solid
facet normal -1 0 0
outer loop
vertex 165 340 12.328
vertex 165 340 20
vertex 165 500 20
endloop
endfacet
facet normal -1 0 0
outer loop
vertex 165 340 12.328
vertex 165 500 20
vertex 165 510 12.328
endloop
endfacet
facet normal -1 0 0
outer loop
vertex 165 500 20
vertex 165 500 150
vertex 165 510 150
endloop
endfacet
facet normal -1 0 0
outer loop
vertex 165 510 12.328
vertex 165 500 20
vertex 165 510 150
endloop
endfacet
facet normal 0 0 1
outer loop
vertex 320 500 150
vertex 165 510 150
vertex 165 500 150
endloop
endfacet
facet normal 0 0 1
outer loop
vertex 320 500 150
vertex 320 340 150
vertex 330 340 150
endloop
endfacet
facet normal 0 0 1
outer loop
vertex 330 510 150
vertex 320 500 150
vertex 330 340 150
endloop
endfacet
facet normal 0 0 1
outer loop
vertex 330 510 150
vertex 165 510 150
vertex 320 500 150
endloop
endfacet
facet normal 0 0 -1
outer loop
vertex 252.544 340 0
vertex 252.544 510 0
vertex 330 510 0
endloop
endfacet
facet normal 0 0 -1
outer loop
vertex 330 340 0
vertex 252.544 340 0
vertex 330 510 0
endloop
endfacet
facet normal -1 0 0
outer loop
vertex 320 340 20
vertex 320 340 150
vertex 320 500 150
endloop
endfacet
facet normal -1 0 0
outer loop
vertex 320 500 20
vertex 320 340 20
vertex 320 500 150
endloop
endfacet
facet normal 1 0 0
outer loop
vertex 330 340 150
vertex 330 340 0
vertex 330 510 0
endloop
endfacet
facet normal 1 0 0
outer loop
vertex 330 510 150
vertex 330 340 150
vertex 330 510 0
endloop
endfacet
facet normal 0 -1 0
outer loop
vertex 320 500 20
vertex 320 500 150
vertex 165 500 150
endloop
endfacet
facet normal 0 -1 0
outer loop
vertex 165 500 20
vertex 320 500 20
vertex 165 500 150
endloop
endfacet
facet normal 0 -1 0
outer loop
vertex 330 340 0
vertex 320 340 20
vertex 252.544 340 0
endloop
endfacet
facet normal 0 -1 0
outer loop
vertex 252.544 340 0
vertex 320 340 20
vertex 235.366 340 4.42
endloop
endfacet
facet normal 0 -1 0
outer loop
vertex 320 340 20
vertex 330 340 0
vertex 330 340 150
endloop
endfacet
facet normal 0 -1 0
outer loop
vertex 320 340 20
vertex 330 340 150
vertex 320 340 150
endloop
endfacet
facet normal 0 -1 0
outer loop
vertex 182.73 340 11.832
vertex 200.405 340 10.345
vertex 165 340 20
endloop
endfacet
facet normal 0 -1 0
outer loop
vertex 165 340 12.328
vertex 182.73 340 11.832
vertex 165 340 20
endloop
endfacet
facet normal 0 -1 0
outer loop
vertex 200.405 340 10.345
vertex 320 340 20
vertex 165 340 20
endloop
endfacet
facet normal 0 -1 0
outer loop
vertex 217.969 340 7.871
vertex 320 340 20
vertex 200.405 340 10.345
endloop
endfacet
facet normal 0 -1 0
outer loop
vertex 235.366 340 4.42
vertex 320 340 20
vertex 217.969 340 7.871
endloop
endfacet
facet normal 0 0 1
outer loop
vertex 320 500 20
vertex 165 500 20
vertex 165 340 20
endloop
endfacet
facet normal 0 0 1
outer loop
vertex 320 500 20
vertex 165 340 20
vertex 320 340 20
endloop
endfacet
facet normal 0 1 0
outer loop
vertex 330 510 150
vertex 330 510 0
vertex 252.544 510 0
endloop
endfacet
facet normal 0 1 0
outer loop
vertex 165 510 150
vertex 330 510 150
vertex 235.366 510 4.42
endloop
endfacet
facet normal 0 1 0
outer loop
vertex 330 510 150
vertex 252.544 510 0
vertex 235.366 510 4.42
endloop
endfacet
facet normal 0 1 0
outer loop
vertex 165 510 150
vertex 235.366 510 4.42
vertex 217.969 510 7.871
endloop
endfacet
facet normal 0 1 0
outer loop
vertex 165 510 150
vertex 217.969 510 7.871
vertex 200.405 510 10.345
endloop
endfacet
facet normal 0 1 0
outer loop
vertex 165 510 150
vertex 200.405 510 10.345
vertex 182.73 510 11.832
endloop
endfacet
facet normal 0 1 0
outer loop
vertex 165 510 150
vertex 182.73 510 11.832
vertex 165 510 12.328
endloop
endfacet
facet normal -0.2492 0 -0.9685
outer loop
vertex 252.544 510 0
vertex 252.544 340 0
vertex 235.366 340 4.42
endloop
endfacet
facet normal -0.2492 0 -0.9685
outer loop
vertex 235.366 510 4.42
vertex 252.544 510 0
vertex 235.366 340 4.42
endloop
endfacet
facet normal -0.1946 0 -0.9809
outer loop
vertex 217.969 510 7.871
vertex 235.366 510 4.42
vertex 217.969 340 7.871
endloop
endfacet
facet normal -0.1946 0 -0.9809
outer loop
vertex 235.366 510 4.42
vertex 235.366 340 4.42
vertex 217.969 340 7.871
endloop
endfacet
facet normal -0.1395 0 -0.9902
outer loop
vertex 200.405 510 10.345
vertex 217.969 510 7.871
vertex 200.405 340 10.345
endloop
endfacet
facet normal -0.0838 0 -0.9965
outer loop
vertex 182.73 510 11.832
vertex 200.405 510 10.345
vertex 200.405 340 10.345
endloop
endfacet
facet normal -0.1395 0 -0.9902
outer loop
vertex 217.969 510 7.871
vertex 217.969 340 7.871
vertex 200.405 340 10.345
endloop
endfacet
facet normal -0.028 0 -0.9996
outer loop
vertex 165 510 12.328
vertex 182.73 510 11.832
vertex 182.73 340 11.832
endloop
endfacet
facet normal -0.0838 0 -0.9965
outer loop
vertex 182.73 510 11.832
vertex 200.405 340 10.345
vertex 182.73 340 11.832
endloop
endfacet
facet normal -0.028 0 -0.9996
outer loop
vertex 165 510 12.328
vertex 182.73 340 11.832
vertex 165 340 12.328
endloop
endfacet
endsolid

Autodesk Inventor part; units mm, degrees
ref_plane "YZ Plane" through (0, 0, 0) normal (1, 0, 0) x (0, 1, 0)
ref_plane "XZ Plane" through (0, 0, 0) normal (0, 1, 0) x (-1, 0, 0)
ref_plane "XY Plane" through (0, 0, 0) normal (0, 0, 1) x (1, 0, 0)
sketch "Sketch1" plane through (0, 0, 0) normal (0, 0, 1) x (1, 0, 0)
  line L0 (0, 0) -> (330, 0)
  line L1 (330, 0) -> (330, 510)
  line L2 (330, 510) -> (0, 510)
  line L3 (0, 510) -> (0, 0)
  dimension "d0" = 330
  dimension "d1" = 510
extrude "Extrusion1" add sketch "Sketch1" along normal blind 150
sketch "Sketch2" plane through (0, 0, 0) normal (0, -1, 0) x (1, 0, 0)
  circle A0 centre (165, -304.672) radius 315
  line L0 (85, 0) -> (245, 0)
  line L1 (0, 0) -> (330, 0) projected
  circle A1 centre (165, -304.672) radius 317
  point P0 (165, 0)
  point P1 (165, 0)
  dimension "d4" = 630
  dimension "d8" = 160
  dimension "d9" = 2
extrude "Extrusion2" cut sketch "Sketch2" against normal through all
sketch "Sketch3" plane through (0, 0, 150) normal (0, 0, 1) x (1, 0, 0)
  line L0 (0, 0) -> (330, 0) projected
  line L1 (330, 0) -> (330, 510) projected
  line L2 (330, 510) -> (0, 510) projected
  line L3 (0, 510) -> (0, 0) projected
  line L4 (10, 10) -> (320, 10)
  line L5 (320, 10) -> (320, 500)
  line L6 (320, 500) -> (10, 500)
  line L7 (10, 500) -> (10, 10)
  dimension "d10" = 10
extrude "Extrusion3" cut sketch "Sketch3" against normal blind 130 contours L7 L6 L5 L4
sketch "Sketch4" plane through (0, 0, 20) normal (0, 0, 1) x (1, 0, 0)
  line L0 (10, 500) -> (320, 500) construction
  line L1 (85, 500) -> (245, 500) construction
  line L2 (245, 500) -> (245, 10) construction
  line L3 (245, 10) -> (85, 10) construction
  line L4 (85, 10) -> (85, 500) construction
  line L5 (320, 10) -> (10, 10) construction
  line L6 (85, 500) -> (245, 500) construction
  line L7 (245, 500) -> (245, 455) construction
  line L8 (245, 455) -> (85, 455) construction
  line L9 (85, 455) -> (85, 500) construction
  line L10 (85, 455) -> (245, 455) construction
  line L11 (245, 455) -> (245, 400) construction
  line L12 (245, 400) -> (85, 400) construction
  line L13 (85, 400) -> (85, 455) construction
  line L14 (85, 400) -> (245, 400) construction
  line L15 (245, 400) -> (245, 345) construction
  line L16 (245, 345) -> (85, 345) construction
  line L17 (85, 345) -> (85, 400) construction
  line L18 (85, 345) -> (245, 345) construction
  line L19 (245, 345) -> (245, 290) construction
  line L20 (245, 290) -> (85, 290) construction
  line L21 (85, 290) -> (85, 345) construction
  line L22 (85, 290) -> (245, 290) construction
  line L23 (245, 290) -> (245, 235) construction
  line L24 (245, 235) -> (85, 235) construction
  line L25 (85, 235) -> (85, 290) construction
  circle A0 centre (130.3559, 262.5) radius 15
  circle A1 centre (199.6441, 262.5) radius 15
  line L26 (130.3559, 262.5) -> (199.6441, 262.5) construction
  point P0 (0, 0)
  point P1 (165, 500)
  point P2 (165, 500)
  point P3 (165, 262.5)
  point P4 (165, 235)
  point P5 (245, 262.5)
  dimension "d13" = 160
  dimension "d14" = 45
  dimension "d15" = 55
  dimension "d16" = 55
  dimension "d17" = 55
  dimension "d18" = 55
  dimension "d19" = 30
  dimension "d20" = 30
  dimension "d21" = 69.2883
extrude "Extrusion4" cut sketch "Sketch4" against normal through all
sketch "Sketch5" plane through (0, 0, 150) normal (0, 0, 1) x (1, 0, 0)
  line L0 (0, 0) -> (330, 0) projected
  line L1 (77.4557, 510) -> (252.5443, 510) projected
  line L2 (0, 0) -> (165, 0)
  line L3 (165, 0) -> (165, 510)
  line L4 (165, 510) -> (0, 510)
  line L5 (0, 510) -> (0, 0)
  line L6 (330, 0) -> (330, 510) projected
  line L7 (0, 0) -> (330, 0)
  line L8 (330, 0) -> (330, 340)
  line L9 (330, 340) -> (0, 340)
  line L10 (0, 340) -> (0, 0)
  dimension "d24" = 340
extrude "Extrusion5" cut sketch "Sketch5" against normal through all
properties part number "CA002" material "ABS Plastic"
